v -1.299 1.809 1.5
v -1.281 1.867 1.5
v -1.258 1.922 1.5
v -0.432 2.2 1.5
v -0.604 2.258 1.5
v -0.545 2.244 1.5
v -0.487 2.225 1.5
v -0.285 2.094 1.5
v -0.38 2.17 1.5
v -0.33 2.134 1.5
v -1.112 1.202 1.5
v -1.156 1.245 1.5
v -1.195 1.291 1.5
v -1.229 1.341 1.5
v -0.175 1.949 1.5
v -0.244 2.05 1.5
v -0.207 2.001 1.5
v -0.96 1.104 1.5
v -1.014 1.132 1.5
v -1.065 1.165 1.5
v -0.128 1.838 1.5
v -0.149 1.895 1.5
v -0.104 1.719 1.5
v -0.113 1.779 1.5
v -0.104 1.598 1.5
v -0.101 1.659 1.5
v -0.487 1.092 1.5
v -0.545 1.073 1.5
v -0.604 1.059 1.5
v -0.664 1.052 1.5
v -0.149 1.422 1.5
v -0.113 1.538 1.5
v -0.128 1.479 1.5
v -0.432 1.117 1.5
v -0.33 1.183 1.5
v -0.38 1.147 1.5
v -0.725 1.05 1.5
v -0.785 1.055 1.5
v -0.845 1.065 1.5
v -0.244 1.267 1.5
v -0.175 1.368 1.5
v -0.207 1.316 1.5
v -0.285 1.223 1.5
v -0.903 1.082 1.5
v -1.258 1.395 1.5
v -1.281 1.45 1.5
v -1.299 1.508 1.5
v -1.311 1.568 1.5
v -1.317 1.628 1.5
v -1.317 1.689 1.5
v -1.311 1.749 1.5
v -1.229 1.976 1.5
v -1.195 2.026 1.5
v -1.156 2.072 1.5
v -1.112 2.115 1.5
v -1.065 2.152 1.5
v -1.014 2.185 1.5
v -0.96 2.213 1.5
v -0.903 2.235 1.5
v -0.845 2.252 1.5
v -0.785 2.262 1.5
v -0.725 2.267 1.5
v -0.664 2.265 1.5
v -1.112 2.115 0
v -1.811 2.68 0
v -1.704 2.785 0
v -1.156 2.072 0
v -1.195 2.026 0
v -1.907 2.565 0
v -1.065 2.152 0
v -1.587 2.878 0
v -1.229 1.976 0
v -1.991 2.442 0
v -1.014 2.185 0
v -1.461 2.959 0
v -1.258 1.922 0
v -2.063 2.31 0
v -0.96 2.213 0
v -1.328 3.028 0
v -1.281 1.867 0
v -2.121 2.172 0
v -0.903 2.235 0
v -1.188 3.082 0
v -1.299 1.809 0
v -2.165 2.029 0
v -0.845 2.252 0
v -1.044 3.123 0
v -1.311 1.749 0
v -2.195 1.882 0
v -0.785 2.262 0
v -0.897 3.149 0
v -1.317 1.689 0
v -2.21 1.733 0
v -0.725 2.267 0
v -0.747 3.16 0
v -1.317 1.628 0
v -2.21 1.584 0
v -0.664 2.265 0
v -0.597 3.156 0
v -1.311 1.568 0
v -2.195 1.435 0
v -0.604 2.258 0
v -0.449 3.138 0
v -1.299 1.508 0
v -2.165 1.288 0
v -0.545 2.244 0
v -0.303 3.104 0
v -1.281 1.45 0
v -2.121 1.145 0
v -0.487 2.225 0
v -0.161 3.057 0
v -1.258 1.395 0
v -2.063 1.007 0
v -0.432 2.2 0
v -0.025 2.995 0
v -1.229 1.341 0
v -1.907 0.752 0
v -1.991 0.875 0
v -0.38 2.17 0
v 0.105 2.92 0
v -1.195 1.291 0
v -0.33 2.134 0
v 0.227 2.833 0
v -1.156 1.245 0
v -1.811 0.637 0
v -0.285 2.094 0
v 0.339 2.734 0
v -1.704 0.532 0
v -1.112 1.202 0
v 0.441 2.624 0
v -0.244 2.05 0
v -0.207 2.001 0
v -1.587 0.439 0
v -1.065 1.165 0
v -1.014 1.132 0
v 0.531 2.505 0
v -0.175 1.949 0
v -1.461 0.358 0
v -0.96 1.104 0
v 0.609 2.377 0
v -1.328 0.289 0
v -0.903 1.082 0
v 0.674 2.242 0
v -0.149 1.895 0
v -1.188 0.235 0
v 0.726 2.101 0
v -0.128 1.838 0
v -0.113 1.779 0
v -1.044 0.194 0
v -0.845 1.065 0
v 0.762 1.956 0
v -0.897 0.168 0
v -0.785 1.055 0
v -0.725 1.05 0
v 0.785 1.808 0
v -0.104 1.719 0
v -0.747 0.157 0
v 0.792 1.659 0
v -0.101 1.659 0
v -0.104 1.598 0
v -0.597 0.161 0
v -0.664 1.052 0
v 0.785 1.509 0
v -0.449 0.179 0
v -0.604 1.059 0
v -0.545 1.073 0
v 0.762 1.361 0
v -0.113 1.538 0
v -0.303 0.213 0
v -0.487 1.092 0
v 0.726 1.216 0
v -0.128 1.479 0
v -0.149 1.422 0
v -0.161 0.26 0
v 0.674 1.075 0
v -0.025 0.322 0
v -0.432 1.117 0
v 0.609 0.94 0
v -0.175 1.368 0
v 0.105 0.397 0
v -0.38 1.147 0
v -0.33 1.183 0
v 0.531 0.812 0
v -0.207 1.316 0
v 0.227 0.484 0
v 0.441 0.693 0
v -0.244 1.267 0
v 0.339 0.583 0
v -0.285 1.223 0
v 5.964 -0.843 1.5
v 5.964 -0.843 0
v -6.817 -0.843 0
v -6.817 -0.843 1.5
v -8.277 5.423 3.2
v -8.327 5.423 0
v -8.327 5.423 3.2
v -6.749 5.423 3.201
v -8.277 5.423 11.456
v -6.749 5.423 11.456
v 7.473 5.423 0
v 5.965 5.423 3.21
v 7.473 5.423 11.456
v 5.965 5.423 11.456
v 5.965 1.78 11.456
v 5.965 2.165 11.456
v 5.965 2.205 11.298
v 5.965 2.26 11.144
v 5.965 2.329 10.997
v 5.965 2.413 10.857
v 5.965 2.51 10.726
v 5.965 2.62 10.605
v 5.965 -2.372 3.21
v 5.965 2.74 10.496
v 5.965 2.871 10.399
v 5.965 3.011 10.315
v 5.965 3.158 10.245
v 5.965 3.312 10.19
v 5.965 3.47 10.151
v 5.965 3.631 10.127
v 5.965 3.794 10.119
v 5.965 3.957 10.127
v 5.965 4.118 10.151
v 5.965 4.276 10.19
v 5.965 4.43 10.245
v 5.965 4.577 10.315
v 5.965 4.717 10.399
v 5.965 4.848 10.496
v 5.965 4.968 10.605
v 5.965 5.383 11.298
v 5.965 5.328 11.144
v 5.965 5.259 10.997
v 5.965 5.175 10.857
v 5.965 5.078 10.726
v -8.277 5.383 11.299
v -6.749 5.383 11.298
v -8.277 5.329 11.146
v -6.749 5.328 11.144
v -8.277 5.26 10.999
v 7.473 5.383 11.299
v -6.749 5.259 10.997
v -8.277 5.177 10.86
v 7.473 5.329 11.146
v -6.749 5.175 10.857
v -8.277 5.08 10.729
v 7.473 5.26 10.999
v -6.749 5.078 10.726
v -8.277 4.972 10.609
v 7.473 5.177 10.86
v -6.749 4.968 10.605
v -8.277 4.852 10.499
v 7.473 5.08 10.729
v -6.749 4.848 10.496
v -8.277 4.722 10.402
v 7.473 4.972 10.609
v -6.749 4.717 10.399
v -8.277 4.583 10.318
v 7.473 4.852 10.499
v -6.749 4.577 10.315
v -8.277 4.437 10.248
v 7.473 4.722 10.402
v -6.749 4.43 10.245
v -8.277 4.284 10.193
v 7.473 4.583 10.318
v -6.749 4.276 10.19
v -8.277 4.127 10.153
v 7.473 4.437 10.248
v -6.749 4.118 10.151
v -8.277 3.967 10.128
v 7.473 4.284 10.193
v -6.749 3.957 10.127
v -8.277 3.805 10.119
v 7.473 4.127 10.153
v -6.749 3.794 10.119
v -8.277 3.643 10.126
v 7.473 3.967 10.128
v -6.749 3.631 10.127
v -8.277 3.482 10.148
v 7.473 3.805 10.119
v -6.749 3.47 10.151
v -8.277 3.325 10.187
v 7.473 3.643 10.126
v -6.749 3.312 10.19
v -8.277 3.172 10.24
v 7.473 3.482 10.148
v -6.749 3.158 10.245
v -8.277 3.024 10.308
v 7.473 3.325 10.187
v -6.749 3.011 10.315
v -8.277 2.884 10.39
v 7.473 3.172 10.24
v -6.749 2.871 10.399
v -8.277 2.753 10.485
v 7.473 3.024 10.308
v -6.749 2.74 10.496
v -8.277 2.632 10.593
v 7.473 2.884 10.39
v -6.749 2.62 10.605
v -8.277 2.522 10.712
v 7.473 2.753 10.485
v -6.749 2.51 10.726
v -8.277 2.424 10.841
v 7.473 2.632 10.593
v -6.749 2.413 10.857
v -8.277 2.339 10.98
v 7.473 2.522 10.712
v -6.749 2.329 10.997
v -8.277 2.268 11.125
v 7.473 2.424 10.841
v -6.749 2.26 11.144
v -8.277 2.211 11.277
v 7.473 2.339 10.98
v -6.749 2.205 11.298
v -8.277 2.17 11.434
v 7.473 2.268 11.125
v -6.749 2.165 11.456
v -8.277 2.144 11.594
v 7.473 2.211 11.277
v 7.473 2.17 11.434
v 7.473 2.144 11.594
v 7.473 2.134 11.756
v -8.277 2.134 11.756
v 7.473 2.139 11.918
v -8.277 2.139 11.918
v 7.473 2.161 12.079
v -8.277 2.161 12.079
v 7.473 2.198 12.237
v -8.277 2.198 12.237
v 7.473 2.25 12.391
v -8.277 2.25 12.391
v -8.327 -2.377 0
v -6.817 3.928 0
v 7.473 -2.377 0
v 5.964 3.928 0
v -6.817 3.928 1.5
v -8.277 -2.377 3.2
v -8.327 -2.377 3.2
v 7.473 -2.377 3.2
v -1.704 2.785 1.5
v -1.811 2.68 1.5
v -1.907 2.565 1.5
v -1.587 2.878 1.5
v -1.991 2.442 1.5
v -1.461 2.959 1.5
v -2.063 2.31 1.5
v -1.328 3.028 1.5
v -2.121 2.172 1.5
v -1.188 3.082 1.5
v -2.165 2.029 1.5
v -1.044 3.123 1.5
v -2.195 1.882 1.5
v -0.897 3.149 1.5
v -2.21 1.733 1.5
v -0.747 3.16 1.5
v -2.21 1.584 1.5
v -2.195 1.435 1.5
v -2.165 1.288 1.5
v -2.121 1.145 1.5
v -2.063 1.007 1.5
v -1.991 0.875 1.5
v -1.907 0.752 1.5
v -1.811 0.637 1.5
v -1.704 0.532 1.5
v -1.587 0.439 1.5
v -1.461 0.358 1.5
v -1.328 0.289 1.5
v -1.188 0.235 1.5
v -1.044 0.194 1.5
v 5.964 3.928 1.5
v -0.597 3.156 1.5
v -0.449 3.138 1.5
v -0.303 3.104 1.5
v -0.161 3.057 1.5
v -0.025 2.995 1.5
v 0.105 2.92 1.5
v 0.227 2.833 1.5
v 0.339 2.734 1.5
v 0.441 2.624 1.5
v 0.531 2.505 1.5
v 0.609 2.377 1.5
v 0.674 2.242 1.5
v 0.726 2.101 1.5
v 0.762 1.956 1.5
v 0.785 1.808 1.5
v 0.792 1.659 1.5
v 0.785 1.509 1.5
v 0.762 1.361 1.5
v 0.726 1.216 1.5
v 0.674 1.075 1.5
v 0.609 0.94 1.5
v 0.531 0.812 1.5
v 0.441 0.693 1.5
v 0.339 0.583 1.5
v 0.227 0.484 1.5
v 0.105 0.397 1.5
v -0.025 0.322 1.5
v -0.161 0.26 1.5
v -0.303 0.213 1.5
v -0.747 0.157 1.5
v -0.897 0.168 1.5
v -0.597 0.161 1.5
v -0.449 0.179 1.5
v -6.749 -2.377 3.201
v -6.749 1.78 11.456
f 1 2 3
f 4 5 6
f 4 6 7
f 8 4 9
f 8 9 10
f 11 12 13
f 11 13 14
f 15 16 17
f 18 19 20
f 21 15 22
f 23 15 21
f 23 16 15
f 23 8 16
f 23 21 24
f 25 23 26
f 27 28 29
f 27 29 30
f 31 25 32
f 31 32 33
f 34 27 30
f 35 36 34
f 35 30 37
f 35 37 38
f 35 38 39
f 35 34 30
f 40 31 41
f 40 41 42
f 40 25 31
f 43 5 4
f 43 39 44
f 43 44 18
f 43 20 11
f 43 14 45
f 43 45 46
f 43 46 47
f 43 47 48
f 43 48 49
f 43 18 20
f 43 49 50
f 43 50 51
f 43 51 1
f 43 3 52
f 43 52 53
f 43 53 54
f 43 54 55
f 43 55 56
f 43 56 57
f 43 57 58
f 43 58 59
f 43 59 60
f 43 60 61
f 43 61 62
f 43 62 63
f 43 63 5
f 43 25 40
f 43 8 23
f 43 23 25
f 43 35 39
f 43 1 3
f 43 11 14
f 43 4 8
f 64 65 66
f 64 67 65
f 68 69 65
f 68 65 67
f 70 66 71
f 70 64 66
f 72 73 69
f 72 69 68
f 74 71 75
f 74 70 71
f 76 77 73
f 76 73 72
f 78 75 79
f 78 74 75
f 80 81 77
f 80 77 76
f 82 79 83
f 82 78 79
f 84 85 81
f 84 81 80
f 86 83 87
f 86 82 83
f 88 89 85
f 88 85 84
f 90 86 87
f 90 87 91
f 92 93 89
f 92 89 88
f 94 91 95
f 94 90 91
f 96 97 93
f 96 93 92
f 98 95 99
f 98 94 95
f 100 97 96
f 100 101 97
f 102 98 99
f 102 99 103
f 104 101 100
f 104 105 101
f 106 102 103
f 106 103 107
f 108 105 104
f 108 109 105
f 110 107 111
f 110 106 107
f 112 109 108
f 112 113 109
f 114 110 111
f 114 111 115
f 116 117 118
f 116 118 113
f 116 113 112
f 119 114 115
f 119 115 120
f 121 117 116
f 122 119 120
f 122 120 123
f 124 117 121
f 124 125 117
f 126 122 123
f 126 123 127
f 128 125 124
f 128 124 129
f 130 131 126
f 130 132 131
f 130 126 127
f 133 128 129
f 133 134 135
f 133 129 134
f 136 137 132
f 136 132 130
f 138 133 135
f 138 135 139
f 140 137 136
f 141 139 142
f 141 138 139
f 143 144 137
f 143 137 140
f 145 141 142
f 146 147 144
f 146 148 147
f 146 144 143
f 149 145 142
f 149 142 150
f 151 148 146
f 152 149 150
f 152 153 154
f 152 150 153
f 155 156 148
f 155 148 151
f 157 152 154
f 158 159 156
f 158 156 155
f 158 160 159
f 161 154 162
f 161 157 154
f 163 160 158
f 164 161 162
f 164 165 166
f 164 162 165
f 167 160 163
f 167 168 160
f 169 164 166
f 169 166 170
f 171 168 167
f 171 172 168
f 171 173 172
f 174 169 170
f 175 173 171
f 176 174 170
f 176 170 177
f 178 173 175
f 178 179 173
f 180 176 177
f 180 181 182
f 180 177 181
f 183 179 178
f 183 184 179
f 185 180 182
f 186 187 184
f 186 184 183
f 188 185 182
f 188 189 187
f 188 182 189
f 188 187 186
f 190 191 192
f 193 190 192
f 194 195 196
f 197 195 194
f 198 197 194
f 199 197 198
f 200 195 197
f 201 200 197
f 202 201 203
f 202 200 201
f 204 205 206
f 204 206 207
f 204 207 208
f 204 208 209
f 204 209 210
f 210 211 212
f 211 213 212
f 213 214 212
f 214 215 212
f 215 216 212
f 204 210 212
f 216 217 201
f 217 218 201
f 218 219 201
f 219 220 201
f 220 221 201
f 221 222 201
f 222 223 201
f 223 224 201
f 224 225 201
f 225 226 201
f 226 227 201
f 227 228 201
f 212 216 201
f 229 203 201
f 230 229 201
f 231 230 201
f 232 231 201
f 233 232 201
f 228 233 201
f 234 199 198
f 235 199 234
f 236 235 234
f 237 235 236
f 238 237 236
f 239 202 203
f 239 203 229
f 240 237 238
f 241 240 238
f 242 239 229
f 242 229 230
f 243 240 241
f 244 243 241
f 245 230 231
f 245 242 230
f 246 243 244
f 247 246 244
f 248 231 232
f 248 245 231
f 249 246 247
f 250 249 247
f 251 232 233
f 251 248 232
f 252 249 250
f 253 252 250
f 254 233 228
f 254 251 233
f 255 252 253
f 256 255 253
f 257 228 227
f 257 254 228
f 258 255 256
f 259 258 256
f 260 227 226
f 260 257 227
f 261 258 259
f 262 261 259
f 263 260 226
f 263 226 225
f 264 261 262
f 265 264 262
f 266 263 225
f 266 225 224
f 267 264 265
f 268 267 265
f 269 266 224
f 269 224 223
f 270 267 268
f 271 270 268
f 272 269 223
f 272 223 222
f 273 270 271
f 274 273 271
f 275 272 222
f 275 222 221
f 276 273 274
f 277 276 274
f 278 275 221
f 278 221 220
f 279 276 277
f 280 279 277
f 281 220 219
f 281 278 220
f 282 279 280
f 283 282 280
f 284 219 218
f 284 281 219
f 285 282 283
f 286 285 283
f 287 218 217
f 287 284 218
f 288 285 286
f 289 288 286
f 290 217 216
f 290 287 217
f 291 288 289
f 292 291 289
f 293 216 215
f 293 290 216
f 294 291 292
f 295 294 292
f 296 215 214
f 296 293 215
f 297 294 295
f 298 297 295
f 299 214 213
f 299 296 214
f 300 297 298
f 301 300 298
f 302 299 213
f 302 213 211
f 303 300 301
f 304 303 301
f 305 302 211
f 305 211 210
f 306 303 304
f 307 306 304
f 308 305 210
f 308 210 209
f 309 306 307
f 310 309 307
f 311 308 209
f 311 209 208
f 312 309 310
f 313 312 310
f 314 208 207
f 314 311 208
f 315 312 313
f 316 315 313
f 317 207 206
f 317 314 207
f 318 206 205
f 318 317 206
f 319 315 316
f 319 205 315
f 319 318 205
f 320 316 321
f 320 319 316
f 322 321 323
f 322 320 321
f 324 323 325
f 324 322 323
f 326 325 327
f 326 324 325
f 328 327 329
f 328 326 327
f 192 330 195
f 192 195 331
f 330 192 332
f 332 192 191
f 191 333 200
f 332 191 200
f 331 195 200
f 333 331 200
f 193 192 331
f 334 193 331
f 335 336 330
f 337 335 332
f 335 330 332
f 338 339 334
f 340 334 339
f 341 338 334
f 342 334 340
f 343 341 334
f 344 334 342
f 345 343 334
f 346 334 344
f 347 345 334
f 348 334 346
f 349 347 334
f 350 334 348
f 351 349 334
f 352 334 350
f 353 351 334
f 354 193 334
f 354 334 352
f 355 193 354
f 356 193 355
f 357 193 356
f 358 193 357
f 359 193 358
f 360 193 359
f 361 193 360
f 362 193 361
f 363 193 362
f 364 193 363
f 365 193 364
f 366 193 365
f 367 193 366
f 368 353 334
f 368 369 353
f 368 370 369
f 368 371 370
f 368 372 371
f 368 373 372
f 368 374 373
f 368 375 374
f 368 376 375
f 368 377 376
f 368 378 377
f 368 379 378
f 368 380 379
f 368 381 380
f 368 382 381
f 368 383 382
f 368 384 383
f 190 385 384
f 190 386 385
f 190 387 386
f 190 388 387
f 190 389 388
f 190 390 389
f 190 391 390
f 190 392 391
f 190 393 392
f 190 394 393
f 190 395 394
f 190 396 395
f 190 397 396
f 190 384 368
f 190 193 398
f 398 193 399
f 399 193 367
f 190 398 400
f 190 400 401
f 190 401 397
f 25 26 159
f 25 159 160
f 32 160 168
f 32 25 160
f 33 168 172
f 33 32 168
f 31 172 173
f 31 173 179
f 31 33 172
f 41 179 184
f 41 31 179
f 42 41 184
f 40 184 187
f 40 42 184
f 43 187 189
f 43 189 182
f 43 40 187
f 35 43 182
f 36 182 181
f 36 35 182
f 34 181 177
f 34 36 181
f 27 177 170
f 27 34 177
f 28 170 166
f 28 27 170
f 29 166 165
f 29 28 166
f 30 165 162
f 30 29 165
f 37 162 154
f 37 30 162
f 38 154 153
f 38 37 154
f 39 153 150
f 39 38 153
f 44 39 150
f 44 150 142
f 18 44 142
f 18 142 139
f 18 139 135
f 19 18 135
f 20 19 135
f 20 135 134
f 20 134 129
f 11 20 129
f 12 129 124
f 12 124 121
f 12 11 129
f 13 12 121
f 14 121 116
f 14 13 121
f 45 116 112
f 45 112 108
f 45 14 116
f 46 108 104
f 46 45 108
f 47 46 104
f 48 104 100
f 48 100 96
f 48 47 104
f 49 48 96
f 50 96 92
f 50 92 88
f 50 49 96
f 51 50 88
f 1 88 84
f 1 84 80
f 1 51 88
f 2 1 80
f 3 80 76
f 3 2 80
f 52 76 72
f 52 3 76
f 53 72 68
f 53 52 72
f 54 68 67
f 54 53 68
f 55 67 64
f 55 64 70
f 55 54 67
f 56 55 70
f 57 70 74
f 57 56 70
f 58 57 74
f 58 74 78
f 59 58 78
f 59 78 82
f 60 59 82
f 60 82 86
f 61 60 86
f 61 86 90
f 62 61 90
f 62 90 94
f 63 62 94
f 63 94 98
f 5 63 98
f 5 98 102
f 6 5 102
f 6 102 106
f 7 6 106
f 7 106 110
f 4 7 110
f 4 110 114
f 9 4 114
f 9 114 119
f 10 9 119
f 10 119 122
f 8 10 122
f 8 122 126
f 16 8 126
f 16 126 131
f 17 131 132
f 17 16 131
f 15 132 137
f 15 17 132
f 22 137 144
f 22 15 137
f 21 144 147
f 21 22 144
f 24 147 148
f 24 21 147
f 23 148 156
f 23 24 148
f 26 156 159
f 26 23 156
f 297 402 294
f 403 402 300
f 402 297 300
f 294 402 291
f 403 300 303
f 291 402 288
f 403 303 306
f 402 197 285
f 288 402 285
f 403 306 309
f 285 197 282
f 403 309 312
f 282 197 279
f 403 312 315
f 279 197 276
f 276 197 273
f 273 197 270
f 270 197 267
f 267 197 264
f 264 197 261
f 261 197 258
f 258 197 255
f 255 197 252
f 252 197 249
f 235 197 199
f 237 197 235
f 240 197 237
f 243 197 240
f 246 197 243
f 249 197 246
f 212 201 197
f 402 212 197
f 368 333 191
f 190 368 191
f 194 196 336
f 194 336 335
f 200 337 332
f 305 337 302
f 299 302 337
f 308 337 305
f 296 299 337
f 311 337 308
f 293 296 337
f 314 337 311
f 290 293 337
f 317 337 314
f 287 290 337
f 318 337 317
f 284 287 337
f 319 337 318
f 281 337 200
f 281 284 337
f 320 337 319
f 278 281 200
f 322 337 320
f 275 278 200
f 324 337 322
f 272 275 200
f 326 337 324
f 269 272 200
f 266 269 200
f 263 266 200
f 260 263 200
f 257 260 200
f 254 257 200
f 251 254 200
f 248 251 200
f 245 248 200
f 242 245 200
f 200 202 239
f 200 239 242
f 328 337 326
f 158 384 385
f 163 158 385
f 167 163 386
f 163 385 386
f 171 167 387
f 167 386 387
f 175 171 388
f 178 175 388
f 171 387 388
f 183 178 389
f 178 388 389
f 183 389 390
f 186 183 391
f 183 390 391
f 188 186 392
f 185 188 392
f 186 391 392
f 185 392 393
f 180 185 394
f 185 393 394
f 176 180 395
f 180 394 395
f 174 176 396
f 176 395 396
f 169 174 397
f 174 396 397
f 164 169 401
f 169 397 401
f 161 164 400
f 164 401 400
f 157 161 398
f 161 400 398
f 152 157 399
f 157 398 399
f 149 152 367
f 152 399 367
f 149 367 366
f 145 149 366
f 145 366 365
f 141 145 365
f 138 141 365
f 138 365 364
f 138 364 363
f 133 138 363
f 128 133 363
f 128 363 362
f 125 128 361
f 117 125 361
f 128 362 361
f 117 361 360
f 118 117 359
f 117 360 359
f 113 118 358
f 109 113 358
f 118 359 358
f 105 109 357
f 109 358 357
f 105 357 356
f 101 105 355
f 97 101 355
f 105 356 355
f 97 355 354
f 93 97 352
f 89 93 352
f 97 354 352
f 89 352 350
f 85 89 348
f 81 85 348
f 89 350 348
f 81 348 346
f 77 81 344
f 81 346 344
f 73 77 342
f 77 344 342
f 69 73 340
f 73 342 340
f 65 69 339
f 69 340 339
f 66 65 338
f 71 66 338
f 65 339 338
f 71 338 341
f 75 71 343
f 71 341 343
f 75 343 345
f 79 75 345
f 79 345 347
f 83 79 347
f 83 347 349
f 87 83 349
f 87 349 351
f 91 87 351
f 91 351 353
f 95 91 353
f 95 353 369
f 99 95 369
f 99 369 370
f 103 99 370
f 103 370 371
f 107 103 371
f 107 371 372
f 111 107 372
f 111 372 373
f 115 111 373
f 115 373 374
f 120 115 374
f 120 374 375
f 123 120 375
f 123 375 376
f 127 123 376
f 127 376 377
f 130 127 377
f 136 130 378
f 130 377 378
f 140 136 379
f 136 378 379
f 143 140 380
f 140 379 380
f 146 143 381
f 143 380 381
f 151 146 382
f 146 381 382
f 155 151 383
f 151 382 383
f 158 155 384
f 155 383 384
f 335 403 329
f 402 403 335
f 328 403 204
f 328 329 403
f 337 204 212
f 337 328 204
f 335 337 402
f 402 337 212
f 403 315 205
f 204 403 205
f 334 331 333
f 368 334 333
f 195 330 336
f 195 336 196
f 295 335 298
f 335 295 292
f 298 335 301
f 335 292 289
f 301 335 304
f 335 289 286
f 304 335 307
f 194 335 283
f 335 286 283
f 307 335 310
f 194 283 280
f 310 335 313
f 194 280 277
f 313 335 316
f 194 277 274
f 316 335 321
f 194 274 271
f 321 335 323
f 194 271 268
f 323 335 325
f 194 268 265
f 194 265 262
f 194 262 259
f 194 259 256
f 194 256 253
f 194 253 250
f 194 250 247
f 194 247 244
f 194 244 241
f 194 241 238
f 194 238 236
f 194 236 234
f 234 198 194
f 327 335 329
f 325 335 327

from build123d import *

# Parameters (mm, degrees)
F0_W      = 15.8
F0_H      = 7.8
F1_DEPTH  = 3.2
F3_DEPTH  = 1.5
F4_R      = 1.5020190756
F4_R_2    = 0.6083547137
F5_DEPTH  = 1.5
F7_DEPTH  = 15.75
F10_DEPTH = 25


# Not quite as in the source:
# - the program builds the solid bodies; features that only make, move or delete a surface that nothing else refers to are left out


with BuildPart() as f1:
    # F0 (on Top) → F1 (new body)
    with BuildSketch(Plane.XY):
        with Locations((-0.4272158258, 1.5226540988)):
            Rectangle(F0_W, F0_H)
    extrude(amount=F1_DEPTH)

    # F2 (on face) → F3 (cut)
    with BuildSketch(Plane(origin=(0, 0, 0), x_dir=(1, 0, 0), z_dir=(0, 0, -1))):
        Polygon((-0.8716915618, 0.8426669519), (-6.8171033636, 0.8426669519), (-6.8171033636, -1.5226540988), (-6.8171033636, -3.9279027842), (-0.4272158258, -3.9279027842), (5.9637515806, -3.9279027842), (5.9637515806, -1.5226540988), (5.9637515806, 0.8426669519), align=None)
    extrude(amount=-F3_DEPTH, mode=Mode.SUBTRACT)

    # F4 (on face) → F5 (join)
    with BuildSketch(Plane(origin=(0, 0, 1.5), x_dir=(1, 0, 0), z_dir=(0, 0, -1))):
        with Locations((-0.7097416674, -1.6585130943)):
            Circle(F4_R)
        with Locations((-0.7097416674, -1.6585130943)):
            Circle(F4_R_2, mode=Mode.SUBTRACT)
    extrude(amount=F5_DEPTH)

    # F6 (on face) → F7 (join)
    with BuildSketch(Plane.YZ.offset(7.4727841742)):
        with BuildLine():
            Line((-2.3773459012, 3.2), (5.4226540988, 3.2))
            Line((5.4226540988, 3.2), (5.4226540988, 11.4559076203))
            ThreePointArc((5.4226540988, 11.4559076203), (3.3247489231, 10.1865208896), (2.2503013028, 12.3906332074))
            Line((2.2503013028, 12.3906332074), (-2.3773459012, 3.2))
        make_face()
    extrude(amount=-F7_DEPTH)

    # F9 (on face) → F10 (cut)
    with BuildSketch(Plane(origin=(0, 5.4226540988, 0), x_dir=(-1, 0, 0), z_dir=(0, 1, 0))):
        Polygon((-5.9649683535, 11.4559076203), (-5.9649683535, 3.21011306), (6.7489589565, 3.2011167647), (6.7489589565, 11.4559076203), align=None)
    extrude(amount=-F10_DEPTH, mode=Mode.SUBTRACT)


solid = f1.part
